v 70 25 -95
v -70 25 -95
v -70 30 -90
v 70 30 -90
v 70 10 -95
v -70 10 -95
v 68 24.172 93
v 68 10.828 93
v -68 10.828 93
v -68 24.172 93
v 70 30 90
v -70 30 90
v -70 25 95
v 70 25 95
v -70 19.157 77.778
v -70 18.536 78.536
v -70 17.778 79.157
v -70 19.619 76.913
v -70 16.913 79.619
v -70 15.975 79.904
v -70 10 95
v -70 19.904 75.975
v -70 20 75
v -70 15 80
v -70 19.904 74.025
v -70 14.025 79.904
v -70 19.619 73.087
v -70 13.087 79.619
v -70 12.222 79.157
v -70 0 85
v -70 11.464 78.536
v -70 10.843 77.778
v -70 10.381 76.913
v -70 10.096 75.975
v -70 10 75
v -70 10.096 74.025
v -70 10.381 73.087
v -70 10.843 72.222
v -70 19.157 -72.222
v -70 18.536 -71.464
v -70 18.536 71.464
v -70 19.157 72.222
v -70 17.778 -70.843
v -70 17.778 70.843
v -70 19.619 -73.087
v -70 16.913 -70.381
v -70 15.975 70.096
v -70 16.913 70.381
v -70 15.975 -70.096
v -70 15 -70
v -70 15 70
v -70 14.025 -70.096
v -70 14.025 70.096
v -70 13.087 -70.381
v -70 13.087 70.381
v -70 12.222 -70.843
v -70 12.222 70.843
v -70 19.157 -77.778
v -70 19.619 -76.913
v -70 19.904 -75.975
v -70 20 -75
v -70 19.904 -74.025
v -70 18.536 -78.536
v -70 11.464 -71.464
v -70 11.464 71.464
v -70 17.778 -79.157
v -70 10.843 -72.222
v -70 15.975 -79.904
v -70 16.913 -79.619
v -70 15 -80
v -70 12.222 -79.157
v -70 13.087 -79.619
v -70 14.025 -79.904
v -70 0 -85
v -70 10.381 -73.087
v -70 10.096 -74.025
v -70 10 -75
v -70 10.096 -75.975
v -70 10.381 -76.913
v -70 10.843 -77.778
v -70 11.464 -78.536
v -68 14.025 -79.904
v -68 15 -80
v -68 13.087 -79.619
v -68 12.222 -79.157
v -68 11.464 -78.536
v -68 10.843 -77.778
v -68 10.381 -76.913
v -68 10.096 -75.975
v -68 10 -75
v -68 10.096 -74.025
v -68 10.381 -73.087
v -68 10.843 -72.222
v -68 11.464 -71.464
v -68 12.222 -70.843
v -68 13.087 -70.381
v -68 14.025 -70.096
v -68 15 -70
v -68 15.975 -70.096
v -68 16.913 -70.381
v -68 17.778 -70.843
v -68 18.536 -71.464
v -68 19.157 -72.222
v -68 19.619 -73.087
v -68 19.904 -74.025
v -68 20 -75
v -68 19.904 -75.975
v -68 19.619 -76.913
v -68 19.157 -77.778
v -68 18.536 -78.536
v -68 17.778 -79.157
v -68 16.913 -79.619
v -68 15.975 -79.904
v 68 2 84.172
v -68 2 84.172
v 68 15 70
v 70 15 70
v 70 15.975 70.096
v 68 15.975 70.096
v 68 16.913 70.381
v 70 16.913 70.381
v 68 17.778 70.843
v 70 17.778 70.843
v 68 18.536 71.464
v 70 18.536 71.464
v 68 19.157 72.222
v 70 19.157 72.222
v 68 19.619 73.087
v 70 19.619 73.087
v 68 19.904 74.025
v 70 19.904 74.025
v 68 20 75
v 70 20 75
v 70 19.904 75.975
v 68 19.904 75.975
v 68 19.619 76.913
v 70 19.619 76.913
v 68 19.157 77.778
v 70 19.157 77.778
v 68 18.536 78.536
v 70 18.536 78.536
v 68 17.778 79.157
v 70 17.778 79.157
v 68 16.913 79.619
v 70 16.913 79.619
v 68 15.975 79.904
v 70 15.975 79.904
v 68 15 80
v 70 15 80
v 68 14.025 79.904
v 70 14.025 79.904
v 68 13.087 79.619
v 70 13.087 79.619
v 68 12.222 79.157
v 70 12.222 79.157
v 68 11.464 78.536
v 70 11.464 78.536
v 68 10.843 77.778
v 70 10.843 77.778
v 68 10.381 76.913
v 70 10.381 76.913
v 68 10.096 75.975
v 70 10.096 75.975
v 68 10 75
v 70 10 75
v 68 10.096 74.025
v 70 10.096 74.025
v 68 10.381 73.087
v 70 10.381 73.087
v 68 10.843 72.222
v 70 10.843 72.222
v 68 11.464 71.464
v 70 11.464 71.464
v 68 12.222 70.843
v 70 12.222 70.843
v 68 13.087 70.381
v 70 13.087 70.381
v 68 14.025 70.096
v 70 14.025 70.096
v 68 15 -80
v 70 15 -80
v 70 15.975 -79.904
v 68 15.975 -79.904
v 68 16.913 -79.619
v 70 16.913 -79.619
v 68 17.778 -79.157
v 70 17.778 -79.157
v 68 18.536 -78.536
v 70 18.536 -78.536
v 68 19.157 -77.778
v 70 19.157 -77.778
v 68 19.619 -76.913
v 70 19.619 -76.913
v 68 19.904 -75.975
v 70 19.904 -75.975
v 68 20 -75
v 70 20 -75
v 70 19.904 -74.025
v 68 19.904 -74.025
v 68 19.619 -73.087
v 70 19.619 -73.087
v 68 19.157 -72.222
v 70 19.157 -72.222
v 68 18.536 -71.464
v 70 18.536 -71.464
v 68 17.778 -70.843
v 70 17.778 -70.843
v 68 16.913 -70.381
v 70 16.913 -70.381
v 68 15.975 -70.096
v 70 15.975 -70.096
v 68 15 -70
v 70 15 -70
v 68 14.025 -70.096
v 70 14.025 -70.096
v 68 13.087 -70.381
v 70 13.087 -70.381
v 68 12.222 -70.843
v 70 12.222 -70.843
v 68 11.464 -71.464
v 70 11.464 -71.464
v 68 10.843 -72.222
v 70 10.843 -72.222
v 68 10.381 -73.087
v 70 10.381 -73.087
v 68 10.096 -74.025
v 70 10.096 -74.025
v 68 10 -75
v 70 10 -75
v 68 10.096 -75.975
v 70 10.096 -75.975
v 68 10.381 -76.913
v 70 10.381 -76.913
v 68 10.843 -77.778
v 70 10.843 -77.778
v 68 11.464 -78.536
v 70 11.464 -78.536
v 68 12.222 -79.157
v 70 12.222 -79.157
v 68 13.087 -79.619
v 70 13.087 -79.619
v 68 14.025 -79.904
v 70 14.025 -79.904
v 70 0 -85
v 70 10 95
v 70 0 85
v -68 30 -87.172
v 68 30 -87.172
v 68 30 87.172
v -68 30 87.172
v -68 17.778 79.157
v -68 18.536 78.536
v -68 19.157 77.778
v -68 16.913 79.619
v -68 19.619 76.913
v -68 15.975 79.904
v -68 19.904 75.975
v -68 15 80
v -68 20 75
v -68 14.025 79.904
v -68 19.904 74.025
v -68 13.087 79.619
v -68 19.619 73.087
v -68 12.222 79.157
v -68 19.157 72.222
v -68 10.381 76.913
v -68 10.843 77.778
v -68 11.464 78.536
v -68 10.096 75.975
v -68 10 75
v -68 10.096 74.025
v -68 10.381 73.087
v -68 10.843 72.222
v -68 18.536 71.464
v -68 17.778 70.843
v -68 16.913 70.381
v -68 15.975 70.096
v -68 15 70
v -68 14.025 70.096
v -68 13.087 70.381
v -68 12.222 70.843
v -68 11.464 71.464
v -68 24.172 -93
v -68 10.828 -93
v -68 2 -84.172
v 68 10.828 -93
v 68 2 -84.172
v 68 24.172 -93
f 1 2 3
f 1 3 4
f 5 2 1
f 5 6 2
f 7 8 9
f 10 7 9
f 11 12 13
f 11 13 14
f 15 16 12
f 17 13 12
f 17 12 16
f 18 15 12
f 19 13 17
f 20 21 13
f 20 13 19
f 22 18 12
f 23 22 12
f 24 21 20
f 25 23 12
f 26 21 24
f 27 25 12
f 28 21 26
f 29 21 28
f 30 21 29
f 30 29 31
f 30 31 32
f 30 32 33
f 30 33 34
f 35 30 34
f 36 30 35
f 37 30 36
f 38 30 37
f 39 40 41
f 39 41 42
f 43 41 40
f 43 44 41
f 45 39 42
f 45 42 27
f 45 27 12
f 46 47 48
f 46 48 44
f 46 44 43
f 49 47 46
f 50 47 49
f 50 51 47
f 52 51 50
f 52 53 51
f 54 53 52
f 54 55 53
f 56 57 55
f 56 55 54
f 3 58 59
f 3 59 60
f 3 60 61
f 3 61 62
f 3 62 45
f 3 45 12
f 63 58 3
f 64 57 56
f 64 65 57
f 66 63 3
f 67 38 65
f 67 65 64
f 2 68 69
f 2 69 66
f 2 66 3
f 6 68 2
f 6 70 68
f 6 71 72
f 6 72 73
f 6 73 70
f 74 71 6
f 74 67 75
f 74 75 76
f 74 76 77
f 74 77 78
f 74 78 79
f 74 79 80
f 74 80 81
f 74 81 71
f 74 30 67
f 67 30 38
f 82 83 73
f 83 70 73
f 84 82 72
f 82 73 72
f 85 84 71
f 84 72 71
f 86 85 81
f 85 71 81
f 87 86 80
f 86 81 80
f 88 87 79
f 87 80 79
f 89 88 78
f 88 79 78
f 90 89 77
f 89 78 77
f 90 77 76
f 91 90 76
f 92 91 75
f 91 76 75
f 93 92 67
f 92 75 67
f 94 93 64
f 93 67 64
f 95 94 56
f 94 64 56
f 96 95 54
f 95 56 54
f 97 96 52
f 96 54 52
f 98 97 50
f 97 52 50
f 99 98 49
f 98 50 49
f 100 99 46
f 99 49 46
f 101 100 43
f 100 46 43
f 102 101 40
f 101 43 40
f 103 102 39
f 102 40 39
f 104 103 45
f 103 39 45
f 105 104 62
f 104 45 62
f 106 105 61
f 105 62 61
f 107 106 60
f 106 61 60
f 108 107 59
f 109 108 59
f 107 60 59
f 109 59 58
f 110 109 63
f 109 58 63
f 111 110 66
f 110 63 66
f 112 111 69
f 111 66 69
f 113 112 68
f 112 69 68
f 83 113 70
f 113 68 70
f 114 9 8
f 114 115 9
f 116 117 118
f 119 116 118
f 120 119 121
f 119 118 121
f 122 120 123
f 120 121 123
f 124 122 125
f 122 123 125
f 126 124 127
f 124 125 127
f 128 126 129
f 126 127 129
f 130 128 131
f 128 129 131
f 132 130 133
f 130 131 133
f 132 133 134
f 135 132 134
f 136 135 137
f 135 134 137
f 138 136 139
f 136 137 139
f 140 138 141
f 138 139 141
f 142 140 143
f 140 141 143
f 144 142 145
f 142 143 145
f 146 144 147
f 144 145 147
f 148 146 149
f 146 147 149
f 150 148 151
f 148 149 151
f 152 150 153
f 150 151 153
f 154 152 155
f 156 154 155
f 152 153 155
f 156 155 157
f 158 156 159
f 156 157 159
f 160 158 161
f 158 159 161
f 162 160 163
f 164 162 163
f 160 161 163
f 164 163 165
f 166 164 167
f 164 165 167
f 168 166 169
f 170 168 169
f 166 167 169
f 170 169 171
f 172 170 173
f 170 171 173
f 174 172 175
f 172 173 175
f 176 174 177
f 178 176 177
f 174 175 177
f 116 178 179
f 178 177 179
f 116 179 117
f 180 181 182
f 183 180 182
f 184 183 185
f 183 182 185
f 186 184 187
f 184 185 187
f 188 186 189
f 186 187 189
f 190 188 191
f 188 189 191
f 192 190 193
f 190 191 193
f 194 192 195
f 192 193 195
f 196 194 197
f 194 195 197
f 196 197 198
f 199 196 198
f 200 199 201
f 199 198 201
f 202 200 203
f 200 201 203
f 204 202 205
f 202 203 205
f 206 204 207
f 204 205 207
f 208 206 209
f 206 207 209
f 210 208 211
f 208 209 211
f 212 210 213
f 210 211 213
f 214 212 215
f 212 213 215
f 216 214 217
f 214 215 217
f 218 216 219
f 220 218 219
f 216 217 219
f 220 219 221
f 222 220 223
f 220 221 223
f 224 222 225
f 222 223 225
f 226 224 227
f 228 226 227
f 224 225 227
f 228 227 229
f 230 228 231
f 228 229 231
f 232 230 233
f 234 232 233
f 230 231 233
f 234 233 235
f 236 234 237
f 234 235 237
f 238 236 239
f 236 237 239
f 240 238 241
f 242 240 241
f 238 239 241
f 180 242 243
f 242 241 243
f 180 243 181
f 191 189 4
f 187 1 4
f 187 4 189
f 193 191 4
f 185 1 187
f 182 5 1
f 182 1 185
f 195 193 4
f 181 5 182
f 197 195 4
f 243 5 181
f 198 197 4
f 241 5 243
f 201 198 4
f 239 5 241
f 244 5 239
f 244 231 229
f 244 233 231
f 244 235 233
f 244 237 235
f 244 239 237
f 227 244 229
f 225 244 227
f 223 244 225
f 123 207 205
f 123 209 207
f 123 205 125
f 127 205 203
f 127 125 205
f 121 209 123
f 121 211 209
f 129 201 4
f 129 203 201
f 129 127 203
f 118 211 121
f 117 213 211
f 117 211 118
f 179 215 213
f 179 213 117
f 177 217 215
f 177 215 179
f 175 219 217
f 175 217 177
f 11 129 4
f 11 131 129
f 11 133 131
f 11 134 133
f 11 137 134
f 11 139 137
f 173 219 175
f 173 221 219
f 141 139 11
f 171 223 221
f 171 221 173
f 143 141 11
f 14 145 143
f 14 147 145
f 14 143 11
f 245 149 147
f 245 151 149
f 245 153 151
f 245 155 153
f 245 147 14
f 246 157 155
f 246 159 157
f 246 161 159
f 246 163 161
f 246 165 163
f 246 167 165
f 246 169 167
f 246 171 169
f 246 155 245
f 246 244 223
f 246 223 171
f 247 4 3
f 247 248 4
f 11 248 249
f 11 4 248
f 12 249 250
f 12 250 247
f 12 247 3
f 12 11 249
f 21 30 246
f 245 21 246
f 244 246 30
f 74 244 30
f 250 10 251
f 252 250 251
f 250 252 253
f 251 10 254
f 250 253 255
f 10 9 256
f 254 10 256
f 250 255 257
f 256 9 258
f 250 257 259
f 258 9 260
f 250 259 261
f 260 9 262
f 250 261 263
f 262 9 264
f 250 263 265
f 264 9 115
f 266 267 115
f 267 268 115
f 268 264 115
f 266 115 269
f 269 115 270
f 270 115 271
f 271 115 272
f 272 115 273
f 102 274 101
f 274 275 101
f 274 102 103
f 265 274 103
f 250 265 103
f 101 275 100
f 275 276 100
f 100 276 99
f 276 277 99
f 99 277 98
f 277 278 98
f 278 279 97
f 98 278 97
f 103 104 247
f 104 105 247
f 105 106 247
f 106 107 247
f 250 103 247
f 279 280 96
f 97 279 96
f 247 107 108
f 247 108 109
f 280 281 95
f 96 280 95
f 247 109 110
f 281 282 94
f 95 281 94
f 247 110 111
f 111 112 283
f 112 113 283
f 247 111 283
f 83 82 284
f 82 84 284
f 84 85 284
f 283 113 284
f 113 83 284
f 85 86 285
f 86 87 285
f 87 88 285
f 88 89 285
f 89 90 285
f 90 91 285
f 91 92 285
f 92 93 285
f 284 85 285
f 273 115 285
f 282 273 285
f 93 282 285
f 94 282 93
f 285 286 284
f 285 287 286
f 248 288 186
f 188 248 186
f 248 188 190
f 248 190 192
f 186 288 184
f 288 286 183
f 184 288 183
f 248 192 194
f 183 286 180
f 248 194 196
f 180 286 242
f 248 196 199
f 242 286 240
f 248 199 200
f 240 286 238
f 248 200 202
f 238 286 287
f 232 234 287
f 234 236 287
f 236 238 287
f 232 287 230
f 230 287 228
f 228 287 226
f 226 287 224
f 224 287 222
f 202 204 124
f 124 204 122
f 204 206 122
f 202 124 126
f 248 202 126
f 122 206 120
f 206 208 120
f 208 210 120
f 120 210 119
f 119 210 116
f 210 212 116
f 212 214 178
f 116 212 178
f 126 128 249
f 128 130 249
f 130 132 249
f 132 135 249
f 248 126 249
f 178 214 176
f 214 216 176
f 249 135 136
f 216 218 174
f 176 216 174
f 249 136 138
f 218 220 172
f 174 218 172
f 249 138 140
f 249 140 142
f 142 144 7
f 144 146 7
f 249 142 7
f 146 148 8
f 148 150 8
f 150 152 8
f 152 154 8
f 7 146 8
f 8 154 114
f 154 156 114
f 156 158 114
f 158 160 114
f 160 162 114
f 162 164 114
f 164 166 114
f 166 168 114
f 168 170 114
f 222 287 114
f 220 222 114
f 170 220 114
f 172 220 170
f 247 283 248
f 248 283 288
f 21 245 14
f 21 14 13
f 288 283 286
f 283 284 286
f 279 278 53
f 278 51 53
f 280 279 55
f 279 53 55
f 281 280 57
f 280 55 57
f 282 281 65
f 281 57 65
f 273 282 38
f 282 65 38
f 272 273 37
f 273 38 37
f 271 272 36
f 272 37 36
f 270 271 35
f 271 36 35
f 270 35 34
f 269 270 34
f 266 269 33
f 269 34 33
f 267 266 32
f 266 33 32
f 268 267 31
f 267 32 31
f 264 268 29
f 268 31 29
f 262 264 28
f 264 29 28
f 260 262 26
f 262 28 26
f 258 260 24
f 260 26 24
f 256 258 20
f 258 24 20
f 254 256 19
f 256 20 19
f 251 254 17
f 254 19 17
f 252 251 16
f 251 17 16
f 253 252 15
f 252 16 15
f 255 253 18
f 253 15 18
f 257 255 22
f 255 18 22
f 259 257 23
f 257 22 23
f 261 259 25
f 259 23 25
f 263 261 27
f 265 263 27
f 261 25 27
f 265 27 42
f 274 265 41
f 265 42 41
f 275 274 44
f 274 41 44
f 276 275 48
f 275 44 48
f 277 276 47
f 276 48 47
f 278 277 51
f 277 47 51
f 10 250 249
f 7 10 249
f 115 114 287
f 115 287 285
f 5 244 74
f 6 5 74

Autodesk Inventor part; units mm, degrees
ref_plane "YZ Plane" through (0, 0, 0) normal (1, 0, 0) x (0, 1, 0)
ref_plane "XZ Plane" through (0, 0, 0) normal (0, 1, 0) x (-1, 0, 0)
ref_plane "XY Plane" through (0, 0, 0) normal (0, 0, 1) x (1, 0, 0)
sketch "Esquisse1" plane through (0, 0, 0) normal (0, 1, 0) x (-1, 0, 0)
  line L0 (-70, 95) -> (70, 95)
  line L1 (70, 95) -> (70, -95)
  line L2 (70, -95) -> (-70, -95)
  line L3 (-70, -95) -> (-70, 95)
  line L4 (-70, 95) -> (70, -95) construction
  line L5 (70, 95) -> (-70, -95) construction
  point P0 (0, 0)
  dimension "d0" = 140
  dimension "d1" = 190
extrude "Extrusion1" add sketch "Esquisse1" along normal blind 30
chamfer "Chanfrein1" distance 10 angle 45 2 edges at (0, 0, 95) (0, 0, -95)
chamfer "Chanfrein2" distance 5 angle 45 2 edges at (0, 30, 95) (0, 30, -95)
shell "Coque1" thickness 2 removed faces 1 at (23.3333, 30, 30)
sketch "Esquisse2" plane through (70, 0, 85) normal (1, 0, 0) x (0, 0, -1)
  line L0 (-10, 10) -> (-10, 25) projected
  line L1 (180, 10) -> (180, 25) projected
  line L2 (-5, 30) -> (175, 30) projected
  line L3 (170, 0) -> (0, 0) projected
  circle A0 centre (10, 15) radius 5
  line L4 (85, 0) -> (85, 30)
  circle A1 centre (160, 15) radius 5
  dimension "d11" = 10
  dimension "d12" = 20
  dimension "d13" = 15
extrude "Extrusion2" cut sketch "Esquisse2" against normal blind 3
ref_plane "Plan de construction1" through (0, 0, 85) normal (1, 0, 0) x (0, 0, -1)
mirror "Symétrie1" about plane through (0, 0, 85) normal (1, 0, 0) of "Extrusion2"
properties part number "Chassis"
